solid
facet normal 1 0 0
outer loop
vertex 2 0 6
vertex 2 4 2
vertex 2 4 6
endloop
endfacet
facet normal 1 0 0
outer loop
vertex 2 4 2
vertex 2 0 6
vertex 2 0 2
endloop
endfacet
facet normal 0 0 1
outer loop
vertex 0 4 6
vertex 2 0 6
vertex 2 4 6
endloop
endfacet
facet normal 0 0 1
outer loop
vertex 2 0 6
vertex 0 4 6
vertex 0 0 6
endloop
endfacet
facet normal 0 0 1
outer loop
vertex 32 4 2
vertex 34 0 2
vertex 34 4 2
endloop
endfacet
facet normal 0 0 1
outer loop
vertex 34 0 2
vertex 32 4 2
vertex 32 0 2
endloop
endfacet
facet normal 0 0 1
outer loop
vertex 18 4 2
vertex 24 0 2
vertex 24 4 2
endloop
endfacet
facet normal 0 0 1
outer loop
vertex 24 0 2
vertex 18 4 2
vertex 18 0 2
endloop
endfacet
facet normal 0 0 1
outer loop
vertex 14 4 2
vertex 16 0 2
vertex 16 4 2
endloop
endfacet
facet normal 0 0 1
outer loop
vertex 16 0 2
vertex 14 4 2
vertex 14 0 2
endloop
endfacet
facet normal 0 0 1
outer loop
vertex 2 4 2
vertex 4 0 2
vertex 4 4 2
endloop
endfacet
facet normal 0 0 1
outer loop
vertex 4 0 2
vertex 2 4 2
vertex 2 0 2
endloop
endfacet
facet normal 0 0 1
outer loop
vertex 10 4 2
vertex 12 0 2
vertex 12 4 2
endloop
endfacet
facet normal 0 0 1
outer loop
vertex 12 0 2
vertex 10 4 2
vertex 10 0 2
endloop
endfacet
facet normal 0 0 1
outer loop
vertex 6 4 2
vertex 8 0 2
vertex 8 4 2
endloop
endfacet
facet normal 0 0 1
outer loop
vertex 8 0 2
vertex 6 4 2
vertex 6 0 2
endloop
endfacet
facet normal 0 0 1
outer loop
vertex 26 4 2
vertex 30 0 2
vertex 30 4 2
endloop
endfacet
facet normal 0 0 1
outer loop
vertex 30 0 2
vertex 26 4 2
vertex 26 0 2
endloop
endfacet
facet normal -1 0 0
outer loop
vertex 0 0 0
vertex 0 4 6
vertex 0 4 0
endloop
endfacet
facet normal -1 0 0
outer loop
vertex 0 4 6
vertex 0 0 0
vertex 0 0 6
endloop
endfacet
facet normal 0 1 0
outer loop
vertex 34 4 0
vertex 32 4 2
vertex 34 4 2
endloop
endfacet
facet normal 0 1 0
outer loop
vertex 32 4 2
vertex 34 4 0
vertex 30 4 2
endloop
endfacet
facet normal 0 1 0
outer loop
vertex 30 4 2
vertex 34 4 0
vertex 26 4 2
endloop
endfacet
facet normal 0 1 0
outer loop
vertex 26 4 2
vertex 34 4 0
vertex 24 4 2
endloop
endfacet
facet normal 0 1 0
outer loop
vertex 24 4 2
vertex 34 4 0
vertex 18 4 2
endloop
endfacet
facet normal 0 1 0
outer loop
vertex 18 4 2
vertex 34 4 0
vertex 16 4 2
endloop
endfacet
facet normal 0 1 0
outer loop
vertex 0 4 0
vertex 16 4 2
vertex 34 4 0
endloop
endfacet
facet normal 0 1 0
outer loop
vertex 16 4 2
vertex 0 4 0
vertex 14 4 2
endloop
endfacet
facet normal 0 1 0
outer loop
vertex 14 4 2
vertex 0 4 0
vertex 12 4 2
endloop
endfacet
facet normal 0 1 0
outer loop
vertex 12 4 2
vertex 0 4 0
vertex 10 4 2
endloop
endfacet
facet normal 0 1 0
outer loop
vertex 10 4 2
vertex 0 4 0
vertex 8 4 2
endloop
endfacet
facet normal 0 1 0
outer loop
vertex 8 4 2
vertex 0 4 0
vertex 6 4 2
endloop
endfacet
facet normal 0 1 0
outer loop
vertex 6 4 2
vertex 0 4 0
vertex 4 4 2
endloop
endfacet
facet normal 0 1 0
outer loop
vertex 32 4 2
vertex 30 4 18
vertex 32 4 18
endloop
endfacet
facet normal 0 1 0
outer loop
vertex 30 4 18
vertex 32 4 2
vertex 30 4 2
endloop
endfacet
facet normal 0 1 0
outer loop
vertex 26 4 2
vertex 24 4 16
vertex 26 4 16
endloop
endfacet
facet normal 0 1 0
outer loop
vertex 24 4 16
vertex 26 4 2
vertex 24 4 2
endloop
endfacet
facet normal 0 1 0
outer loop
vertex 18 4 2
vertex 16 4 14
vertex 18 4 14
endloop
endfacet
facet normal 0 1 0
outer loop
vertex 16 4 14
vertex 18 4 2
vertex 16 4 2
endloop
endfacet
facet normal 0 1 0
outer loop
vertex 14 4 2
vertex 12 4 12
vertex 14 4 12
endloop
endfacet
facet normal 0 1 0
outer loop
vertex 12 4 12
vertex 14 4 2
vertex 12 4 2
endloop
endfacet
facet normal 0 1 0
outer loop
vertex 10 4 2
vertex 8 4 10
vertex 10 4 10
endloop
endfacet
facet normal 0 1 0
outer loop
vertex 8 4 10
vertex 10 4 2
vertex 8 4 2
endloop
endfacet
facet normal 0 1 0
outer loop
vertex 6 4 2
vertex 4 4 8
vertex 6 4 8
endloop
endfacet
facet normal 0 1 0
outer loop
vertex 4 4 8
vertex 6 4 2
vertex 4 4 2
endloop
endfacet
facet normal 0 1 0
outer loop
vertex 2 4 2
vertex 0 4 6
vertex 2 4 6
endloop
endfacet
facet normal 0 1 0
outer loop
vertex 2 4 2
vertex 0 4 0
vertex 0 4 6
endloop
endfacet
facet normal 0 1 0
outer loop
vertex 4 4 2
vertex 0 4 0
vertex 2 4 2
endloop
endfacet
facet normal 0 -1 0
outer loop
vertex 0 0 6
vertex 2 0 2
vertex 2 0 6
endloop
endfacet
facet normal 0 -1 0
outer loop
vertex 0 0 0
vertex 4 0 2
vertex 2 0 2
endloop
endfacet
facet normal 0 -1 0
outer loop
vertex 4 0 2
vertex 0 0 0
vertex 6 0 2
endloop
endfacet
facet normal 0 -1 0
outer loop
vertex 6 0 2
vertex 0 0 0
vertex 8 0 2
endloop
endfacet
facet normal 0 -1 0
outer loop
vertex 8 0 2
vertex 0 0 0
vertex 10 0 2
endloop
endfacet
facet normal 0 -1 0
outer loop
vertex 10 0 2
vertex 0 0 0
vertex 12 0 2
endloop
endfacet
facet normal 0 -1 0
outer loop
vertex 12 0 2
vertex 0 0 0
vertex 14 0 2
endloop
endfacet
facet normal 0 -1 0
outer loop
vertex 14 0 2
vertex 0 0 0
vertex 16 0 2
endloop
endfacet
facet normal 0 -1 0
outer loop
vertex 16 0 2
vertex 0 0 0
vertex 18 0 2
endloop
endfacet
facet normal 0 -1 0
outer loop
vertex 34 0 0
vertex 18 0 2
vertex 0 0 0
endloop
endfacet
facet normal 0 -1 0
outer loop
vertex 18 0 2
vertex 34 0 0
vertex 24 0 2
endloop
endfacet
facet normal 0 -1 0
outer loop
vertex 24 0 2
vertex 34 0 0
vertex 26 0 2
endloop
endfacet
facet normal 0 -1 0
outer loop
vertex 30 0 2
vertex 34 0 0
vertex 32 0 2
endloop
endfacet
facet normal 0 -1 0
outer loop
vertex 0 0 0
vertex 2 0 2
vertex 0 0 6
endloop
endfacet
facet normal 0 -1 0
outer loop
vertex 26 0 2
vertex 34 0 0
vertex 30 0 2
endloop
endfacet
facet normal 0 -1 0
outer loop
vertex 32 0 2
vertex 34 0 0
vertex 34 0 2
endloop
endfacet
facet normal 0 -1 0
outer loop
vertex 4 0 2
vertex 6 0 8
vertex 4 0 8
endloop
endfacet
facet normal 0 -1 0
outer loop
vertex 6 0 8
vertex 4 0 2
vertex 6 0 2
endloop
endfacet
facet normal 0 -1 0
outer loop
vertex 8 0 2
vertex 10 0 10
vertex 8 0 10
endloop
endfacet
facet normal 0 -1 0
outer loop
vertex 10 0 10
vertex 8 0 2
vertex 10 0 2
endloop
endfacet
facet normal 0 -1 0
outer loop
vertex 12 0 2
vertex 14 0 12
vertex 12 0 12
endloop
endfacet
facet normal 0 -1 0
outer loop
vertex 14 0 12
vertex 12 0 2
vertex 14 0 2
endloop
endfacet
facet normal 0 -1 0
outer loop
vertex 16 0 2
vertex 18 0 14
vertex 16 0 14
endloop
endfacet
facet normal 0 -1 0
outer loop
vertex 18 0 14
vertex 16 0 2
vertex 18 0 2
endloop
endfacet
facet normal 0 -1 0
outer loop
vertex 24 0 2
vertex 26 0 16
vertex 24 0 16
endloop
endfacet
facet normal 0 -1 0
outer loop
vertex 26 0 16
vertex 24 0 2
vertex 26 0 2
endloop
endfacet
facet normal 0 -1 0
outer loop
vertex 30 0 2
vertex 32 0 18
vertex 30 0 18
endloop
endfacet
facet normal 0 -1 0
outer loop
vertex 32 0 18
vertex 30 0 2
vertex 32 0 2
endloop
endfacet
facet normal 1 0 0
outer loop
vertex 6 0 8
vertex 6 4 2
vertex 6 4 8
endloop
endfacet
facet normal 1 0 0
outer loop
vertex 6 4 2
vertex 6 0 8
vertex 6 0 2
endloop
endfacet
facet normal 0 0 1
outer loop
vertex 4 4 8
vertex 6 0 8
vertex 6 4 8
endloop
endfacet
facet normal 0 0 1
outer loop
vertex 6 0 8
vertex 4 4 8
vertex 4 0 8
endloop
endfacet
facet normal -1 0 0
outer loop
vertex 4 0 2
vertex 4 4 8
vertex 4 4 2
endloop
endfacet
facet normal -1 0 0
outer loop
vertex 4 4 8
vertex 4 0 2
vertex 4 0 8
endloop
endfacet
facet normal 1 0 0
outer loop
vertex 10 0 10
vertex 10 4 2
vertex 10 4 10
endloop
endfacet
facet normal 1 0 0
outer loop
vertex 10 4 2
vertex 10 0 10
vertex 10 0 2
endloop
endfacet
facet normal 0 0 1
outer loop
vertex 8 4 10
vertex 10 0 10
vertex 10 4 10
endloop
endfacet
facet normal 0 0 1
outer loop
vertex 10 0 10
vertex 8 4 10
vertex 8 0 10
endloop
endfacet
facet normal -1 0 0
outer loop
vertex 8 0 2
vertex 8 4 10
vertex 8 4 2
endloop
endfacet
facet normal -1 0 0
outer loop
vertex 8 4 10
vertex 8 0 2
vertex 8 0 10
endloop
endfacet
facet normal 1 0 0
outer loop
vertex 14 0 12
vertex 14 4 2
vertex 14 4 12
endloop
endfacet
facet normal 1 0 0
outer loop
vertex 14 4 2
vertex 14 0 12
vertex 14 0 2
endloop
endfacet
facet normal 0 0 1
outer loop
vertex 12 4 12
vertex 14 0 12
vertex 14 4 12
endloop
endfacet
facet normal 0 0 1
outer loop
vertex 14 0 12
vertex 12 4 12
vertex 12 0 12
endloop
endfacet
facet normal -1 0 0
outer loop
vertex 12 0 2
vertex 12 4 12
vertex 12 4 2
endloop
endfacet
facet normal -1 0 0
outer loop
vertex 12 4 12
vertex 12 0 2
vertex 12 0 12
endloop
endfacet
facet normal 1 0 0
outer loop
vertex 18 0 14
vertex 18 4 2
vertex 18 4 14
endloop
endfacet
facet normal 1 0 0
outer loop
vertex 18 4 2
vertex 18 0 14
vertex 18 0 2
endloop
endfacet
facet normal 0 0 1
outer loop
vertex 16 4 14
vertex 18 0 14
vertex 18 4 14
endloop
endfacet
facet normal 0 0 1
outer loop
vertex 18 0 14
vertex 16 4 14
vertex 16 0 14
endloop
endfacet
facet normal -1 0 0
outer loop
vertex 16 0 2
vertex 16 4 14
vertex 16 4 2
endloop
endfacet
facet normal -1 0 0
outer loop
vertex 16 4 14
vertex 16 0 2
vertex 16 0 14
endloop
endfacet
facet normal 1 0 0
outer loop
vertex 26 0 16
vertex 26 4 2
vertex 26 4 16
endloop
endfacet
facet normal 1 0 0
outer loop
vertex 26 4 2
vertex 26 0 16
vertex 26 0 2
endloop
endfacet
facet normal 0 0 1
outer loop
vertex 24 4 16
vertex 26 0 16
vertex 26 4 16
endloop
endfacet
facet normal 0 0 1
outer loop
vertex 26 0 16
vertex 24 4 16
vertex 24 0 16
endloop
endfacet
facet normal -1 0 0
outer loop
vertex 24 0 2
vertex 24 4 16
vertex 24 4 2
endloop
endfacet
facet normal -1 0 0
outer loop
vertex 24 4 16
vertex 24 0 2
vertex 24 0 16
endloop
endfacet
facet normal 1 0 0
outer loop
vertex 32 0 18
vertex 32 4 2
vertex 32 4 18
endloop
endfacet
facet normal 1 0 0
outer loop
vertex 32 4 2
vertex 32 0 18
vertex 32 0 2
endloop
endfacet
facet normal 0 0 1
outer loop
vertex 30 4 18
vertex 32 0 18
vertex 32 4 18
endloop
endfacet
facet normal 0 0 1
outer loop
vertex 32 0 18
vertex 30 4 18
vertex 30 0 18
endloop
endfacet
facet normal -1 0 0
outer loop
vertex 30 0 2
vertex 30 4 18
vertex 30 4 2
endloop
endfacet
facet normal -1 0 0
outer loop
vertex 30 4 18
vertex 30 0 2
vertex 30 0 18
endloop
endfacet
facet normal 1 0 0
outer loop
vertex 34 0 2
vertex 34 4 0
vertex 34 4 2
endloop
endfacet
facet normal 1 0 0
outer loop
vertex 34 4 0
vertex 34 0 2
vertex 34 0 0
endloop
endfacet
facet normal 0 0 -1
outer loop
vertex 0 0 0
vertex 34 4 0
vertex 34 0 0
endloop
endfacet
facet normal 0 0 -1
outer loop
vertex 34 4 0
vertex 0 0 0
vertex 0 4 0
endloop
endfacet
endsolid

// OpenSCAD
// Zweck: each, Bereiche mit Schrittweite, verschachtelte und C-artige for-Ausdrücke – Kammstruktur.
xs = [each [0 : 4 : 16], each [24, 30]];
hs = [for (i = 0, h = 4; i < len(xs); i = i + 1, h = h + 2) h];
pairs = [for (i = [0 : 1], j = [i : 2]) [i, j]];
echo(xs = xs, hs = hs, pairs = pairs);
echo(r = [0 : 0.5 : 2], rev = [for (i = [3 : -1 : 0]) i]);
cube([34, 4, 2]);
for (i = [0 : len(xs) - 1]) translate([xs[i], 0, 2]) cube([2, 4, hs[i]]);
